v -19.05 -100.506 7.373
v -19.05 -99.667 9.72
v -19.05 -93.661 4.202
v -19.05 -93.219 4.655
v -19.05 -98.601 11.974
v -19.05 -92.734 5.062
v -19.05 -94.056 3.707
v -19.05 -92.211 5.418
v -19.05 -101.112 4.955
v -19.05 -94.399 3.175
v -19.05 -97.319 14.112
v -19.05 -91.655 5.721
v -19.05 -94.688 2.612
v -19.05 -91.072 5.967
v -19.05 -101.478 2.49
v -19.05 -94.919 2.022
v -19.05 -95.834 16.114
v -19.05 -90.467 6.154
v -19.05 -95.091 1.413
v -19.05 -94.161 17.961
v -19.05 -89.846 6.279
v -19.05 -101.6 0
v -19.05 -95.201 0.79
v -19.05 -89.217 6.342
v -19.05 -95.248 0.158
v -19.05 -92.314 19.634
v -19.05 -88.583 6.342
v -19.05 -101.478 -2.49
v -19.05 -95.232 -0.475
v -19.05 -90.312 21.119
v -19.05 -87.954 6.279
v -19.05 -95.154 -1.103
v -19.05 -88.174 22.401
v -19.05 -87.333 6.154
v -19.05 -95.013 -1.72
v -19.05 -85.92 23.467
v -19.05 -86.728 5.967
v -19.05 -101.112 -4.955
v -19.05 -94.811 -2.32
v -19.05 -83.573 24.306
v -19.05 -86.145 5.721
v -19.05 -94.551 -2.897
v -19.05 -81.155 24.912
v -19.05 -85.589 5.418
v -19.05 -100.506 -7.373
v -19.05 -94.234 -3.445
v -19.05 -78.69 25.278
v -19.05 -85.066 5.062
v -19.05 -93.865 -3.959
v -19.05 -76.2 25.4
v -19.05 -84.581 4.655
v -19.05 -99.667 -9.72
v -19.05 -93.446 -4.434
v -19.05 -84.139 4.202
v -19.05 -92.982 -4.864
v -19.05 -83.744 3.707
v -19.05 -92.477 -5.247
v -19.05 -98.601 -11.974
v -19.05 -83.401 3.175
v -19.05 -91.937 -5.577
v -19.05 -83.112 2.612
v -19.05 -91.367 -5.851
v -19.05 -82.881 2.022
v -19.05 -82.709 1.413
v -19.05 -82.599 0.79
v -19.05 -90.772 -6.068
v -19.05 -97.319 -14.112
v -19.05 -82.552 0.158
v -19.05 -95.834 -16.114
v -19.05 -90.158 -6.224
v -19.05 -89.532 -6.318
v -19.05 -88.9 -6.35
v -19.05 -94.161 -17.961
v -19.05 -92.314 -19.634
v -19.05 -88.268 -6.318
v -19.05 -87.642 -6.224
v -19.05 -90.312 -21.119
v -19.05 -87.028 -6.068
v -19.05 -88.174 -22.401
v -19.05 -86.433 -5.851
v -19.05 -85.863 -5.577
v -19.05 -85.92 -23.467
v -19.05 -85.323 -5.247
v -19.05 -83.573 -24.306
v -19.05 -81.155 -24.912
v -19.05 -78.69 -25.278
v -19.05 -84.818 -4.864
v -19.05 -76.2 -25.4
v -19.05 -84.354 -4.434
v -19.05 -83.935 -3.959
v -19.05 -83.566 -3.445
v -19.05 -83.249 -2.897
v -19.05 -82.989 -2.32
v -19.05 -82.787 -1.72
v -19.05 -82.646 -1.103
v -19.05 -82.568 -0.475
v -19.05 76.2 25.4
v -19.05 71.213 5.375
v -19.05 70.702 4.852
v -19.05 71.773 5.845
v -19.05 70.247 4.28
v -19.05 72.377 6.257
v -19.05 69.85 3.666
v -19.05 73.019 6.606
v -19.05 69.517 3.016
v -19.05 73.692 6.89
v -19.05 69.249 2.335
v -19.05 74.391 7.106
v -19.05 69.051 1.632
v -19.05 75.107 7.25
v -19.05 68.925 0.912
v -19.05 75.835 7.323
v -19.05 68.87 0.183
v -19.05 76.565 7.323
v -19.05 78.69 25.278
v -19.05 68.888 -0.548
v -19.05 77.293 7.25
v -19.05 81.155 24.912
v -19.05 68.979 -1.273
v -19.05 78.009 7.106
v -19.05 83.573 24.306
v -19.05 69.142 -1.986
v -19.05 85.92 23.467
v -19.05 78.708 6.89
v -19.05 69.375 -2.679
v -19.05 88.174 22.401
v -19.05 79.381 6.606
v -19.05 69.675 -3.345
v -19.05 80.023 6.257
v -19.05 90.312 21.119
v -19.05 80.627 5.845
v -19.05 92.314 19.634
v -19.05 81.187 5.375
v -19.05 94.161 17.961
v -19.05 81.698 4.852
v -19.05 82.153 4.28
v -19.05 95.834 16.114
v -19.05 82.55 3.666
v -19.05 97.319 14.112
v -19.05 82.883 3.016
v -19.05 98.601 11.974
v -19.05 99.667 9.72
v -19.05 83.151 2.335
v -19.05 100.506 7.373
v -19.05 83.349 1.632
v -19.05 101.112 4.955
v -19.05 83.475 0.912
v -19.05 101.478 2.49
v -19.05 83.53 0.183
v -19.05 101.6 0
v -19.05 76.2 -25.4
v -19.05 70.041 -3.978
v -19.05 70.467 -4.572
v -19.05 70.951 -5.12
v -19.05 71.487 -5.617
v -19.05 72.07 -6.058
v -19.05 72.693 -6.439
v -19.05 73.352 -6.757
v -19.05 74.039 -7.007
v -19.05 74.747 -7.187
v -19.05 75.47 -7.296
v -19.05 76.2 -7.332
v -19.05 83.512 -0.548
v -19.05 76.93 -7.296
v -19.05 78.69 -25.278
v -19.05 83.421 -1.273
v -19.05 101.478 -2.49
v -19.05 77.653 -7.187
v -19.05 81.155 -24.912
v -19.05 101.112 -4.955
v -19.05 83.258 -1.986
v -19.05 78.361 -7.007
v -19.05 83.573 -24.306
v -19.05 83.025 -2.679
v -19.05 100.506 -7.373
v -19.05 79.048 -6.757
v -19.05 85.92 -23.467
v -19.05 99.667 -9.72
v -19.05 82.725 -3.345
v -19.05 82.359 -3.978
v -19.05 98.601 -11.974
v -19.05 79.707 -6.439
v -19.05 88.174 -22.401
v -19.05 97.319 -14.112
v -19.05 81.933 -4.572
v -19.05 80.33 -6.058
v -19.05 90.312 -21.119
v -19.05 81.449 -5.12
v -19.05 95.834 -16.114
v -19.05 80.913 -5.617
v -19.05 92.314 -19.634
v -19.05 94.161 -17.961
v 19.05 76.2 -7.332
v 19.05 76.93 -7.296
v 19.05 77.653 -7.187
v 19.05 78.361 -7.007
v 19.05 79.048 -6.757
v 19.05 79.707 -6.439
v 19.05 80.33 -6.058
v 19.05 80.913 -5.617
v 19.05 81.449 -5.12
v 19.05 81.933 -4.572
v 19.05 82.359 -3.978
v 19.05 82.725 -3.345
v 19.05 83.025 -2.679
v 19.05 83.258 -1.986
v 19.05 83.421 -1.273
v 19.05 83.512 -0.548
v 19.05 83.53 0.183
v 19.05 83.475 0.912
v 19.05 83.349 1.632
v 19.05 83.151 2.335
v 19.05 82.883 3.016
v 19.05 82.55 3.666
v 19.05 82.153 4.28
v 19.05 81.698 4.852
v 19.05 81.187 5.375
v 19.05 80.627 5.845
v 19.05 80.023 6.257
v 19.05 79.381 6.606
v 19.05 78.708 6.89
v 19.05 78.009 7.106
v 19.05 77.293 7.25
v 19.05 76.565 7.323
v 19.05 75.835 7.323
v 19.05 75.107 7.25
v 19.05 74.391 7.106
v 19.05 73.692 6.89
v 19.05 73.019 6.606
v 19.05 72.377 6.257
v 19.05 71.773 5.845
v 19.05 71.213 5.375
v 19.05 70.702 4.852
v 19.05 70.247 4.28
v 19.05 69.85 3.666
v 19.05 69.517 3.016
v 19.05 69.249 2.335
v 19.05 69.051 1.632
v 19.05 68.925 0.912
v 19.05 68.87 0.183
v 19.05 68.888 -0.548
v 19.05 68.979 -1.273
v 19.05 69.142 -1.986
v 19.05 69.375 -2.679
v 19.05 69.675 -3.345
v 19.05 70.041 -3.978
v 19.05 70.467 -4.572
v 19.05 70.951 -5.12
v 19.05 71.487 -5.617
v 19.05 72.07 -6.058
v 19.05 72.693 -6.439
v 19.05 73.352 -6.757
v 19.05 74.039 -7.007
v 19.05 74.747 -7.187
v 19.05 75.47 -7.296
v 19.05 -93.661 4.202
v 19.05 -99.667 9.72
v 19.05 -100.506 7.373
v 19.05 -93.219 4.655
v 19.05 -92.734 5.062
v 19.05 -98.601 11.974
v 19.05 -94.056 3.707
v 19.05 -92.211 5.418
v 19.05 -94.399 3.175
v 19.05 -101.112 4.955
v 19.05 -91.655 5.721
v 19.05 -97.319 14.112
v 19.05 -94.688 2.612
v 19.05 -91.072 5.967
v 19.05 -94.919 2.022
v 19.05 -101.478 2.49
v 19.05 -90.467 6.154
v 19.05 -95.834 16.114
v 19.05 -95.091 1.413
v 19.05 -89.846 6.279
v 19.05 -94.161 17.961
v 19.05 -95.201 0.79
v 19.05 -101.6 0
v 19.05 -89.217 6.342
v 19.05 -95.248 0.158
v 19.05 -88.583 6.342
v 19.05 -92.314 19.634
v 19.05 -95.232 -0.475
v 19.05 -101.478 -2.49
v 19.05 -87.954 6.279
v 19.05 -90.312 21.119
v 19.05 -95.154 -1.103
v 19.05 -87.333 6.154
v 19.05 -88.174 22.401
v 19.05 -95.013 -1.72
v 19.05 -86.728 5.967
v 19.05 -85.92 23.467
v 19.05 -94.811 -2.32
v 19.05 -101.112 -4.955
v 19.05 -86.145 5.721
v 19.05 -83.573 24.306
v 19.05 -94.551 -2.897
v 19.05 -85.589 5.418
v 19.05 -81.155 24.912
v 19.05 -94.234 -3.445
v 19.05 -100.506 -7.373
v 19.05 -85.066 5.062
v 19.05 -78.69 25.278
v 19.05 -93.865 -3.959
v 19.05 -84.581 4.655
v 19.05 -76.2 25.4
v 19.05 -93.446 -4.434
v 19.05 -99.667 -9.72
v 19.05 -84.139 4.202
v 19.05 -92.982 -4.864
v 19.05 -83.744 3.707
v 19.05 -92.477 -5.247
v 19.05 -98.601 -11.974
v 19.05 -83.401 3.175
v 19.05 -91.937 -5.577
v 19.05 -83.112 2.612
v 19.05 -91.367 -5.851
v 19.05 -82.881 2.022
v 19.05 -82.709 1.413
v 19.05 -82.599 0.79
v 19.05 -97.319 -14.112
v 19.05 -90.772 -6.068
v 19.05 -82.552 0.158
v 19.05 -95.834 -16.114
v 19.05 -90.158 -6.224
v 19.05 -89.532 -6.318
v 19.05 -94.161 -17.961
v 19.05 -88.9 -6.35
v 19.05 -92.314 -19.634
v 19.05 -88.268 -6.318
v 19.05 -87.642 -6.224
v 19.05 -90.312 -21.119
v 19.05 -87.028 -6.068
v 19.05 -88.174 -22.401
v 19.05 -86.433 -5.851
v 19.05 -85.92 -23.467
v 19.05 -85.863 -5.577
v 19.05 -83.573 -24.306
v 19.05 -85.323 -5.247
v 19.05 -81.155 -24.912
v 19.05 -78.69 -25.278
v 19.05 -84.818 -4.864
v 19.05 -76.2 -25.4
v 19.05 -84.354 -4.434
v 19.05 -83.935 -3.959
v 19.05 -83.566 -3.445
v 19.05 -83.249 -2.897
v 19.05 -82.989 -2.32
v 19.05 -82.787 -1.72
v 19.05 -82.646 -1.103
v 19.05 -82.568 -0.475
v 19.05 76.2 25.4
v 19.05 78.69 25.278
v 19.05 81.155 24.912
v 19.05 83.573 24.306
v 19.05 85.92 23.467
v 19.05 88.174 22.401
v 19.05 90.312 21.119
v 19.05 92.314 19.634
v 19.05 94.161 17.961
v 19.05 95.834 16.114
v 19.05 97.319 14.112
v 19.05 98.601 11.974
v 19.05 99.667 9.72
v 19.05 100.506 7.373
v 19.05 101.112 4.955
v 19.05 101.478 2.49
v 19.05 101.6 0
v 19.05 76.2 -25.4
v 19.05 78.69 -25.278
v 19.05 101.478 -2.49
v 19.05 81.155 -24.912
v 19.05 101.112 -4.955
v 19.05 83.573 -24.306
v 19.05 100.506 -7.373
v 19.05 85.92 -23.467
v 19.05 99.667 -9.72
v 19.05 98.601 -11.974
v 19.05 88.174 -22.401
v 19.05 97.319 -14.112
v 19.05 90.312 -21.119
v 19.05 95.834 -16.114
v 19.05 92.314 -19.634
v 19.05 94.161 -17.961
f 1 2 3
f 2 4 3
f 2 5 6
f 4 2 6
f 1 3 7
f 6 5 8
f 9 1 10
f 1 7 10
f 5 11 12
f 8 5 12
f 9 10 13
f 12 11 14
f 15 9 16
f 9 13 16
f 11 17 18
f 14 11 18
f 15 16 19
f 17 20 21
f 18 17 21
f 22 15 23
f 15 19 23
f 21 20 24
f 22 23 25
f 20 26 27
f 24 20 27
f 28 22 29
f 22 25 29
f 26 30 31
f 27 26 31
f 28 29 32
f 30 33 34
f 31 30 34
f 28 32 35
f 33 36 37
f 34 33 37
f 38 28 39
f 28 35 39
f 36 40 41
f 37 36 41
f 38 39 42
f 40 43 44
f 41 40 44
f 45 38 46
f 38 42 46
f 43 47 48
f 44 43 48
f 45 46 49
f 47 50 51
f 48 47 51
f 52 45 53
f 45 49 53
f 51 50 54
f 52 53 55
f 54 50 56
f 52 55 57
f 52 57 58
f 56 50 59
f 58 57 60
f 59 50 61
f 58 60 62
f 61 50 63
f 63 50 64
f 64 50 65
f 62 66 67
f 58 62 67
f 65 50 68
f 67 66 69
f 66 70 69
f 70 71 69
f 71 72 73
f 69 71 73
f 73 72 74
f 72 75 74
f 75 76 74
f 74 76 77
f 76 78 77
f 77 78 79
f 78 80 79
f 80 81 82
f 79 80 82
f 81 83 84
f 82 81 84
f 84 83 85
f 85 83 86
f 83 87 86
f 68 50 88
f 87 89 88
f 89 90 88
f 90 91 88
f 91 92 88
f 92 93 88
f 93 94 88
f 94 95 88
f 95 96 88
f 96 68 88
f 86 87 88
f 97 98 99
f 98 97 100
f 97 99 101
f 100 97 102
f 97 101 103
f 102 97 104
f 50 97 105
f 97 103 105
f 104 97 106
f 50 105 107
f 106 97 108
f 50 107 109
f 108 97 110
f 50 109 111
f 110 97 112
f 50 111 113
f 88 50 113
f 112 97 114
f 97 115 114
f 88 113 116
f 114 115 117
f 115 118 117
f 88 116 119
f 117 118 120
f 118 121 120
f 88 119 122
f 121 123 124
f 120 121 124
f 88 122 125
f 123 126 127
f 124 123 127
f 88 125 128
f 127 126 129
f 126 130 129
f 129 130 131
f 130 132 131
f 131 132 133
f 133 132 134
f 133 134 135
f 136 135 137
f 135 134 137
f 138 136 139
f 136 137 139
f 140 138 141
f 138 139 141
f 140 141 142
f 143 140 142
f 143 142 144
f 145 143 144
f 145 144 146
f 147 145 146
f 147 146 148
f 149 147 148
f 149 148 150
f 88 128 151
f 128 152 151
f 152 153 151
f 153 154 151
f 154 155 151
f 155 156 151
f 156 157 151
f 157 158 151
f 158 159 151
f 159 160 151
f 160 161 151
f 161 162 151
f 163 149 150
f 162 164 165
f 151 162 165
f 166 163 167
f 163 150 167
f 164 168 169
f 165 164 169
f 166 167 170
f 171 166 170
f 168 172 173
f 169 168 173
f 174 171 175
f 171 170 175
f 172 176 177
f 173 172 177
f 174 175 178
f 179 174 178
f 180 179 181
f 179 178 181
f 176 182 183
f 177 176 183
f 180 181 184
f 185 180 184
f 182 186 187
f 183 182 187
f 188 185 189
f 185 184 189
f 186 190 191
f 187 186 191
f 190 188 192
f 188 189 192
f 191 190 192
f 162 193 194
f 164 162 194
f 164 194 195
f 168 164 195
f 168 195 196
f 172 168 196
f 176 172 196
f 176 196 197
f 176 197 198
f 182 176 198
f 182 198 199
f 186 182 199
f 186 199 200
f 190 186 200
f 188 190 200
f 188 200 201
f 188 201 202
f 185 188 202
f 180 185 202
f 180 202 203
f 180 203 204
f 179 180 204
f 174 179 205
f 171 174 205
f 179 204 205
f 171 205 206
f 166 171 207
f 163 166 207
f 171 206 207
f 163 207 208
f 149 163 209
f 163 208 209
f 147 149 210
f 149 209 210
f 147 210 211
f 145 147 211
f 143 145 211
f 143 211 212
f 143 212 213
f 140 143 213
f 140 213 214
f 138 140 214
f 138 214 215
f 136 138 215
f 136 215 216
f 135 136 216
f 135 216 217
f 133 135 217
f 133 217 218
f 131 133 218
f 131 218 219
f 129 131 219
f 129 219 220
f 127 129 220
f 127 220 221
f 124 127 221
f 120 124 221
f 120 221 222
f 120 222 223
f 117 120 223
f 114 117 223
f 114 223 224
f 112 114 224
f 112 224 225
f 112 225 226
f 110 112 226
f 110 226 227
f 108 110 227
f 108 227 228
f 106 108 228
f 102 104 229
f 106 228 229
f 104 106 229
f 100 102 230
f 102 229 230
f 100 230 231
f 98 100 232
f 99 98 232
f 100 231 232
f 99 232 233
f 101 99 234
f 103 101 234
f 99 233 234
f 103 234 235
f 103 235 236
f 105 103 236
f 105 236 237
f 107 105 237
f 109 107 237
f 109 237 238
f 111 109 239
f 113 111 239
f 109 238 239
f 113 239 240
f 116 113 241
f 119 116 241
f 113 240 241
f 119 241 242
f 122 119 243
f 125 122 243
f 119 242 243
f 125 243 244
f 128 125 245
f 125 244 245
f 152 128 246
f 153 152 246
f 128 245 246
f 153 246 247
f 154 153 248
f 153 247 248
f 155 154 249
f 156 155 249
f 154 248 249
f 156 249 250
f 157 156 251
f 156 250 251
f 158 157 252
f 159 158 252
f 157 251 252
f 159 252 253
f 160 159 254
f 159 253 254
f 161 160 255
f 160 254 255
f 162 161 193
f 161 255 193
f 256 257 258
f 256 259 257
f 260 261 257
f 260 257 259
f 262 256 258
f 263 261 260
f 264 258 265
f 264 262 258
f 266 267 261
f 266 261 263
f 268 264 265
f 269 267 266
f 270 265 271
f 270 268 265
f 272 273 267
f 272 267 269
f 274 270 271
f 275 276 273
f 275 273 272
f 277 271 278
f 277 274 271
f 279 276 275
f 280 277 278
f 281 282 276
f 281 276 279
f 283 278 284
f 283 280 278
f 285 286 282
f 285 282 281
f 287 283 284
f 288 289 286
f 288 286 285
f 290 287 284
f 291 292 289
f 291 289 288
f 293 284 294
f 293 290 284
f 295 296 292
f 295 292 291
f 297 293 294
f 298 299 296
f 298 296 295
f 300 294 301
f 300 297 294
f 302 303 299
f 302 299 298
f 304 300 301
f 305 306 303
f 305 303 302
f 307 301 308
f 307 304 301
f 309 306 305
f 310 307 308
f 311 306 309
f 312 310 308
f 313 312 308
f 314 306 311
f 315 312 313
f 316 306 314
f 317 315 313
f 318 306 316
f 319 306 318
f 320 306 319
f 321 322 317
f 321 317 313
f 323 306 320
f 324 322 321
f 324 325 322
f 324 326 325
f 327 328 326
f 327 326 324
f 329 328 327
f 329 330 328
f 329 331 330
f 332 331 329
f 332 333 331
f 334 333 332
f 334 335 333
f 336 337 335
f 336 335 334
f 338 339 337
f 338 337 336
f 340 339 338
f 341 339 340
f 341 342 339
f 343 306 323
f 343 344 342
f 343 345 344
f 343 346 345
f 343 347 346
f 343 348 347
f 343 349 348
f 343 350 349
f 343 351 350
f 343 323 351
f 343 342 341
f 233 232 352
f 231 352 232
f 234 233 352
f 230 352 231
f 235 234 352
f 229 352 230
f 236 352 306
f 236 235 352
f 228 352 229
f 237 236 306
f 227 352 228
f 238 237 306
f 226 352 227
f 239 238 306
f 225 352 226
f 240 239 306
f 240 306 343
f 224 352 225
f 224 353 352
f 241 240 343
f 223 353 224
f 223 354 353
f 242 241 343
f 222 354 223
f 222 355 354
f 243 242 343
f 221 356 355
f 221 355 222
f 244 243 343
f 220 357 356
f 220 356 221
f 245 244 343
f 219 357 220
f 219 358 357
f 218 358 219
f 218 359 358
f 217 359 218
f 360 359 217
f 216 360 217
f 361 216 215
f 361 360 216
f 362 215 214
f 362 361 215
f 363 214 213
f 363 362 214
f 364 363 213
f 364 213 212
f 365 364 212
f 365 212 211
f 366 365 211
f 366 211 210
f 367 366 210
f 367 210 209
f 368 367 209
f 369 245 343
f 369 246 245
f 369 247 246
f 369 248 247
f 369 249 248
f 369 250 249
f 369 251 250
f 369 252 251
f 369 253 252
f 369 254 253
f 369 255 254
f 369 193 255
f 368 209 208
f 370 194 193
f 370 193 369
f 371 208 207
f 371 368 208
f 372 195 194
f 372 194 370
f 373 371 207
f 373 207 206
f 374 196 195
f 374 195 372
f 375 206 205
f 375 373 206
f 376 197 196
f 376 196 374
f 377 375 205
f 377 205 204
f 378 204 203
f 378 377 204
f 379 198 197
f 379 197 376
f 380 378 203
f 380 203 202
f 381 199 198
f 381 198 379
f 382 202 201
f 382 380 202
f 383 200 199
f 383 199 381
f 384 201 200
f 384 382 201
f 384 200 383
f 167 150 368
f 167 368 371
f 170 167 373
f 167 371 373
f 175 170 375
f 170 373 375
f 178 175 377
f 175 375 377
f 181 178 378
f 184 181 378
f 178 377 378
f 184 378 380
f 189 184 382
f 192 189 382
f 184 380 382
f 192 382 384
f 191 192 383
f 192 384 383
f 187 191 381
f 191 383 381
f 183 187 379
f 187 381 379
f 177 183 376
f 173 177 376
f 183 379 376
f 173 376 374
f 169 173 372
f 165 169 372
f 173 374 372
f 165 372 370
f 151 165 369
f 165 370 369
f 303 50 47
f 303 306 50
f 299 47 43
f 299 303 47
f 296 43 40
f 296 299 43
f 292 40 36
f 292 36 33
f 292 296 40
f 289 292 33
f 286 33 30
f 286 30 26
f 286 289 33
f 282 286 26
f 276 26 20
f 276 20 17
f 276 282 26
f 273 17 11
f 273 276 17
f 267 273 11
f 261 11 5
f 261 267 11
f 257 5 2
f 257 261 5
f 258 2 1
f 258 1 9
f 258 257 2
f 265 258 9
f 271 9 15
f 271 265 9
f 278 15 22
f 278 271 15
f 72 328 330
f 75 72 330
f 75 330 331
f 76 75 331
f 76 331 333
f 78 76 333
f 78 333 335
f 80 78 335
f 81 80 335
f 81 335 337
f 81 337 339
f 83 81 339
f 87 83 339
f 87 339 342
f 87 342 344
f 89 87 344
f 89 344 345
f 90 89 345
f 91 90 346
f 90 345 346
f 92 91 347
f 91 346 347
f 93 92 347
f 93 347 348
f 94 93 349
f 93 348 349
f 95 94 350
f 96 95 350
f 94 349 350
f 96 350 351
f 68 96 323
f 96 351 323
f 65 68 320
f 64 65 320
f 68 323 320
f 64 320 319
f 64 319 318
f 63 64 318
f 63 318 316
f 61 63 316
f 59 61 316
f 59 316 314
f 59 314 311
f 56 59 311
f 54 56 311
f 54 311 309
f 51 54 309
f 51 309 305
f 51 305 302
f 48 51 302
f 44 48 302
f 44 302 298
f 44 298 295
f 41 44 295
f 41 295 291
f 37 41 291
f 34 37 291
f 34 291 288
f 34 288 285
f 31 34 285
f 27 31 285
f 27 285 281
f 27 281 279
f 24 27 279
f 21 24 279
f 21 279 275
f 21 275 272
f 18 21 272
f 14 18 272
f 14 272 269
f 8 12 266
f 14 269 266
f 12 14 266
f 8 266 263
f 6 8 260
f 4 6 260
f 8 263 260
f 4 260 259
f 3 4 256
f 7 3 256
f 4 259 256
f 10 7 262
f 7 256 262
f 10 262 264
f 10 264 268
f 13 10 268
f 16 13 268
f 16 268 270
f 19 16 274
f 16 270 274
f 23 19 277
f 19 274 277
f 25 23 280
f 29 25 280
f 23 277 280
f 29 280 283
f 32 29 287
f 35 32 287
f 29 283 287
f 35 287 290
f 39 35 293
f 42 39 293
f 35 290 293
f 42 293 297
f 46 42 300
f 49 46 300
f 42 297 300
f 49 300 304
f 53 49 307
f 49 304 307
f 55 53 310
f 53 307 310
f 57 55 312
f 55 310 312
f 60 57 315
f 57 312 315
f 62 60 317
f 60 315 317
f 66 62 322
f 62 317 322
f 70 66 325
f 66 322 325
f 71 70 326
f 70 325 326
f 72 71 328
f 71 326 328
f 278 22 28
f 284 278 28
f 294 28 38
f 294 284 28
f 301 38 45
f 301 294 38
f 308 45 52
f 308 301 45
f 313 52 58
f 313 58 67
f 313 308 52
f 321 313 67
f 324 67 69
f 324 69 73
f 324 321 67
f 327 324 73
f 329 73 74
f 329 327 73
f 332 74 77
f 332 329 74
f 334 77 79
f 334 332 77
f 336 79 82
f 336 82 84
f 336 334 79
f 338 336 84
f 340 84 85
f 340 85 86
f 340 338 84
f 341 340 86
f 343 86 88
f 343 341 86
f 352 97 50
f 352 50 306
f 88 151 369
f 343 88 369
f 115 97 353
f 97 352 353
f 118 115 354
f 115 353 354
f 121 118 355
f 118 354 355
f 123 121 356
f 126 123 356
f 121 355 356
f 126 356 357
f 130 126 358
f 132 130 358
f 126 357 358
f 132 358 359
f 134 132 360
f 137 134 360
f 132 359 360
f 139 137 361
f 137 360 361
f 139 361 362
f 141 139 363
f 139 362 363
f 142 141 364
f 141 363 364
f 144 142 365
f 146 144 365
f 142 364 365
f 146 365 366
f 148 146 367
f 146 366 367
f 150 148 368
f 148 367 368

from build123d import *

# Parameters (mm, degrees)
SKETCH1_W           = 38.1
SKETCH1_H           = 50.8
BOSS_EXTRUDE1_DEPTH = 101.6
SKETCH2_R           = 6.35
CUT_EXTRUDE1_DEPTH  = 112.44204772
FILLET1_R           = 25.4
SKETCH3_R           = 7.332348419
CUT_EXTRUDE2_DEPTH  = 441.771925846


with BuildPart() as part:
    # Sketch1 → Boss-Extrude1 (new, symmetric)
    with BuildSketch(Plane(origin=(0, 0, 0), x_dir=(1, 0, 0), z_dir=(0, 1, 0))):
        Rectangle(SKETCH1_W, SKETCH1_H)
    extrude(amount=BOSS_EXTRUDE1_DEPTH, both=True)

    # Sketch2 → Cut-Extrude1 (cut, through all)
    with BuildSketch(Plane(origin=(19.05, 0, 0), x_dir=(0, 0, -1), z_dir=(1, 0, 0))):
        with Locations((0, -88.9)):
            Circle(SKETCH2_R)
    extrude(amount=-CUT_EXTRUDE1_DEPTH, mode=Mode.SUBTRACT)

    # Fillet1
    fillet1_edges = [part.edges().sort_by_distance(p)[0] for p in [
        (0, -101.6, -25.4),
        (0, -101.6, 25.4),
        (0, 101.6, 25.4),
        (0, 101.6, -25.4),
    ]]
    fillet(fillet1_edges, radius=FILLET1_R - 0.0001)  # a hair under: the kernel refuses the full size

    # Sketch3 → Cut-Extrude2 (cut, through all)
    with BuildSketch(Plane(origin=(292.1, -73.474884434, -233.084724799), x_dir=(0, 0.5719099585576003, -0.8203164019466171), z_dir=(1, 0, 0))):
        with Locations(Location((-105.602665842, 256.084237961, 0), (0, 0, 325.116479352))):
            Circle(SKETCH3_R)
    extrude(amount=-CUT_EXTRUDE2_DEPTH, mode=Mode.SUBTRACT)


solid = part.part
